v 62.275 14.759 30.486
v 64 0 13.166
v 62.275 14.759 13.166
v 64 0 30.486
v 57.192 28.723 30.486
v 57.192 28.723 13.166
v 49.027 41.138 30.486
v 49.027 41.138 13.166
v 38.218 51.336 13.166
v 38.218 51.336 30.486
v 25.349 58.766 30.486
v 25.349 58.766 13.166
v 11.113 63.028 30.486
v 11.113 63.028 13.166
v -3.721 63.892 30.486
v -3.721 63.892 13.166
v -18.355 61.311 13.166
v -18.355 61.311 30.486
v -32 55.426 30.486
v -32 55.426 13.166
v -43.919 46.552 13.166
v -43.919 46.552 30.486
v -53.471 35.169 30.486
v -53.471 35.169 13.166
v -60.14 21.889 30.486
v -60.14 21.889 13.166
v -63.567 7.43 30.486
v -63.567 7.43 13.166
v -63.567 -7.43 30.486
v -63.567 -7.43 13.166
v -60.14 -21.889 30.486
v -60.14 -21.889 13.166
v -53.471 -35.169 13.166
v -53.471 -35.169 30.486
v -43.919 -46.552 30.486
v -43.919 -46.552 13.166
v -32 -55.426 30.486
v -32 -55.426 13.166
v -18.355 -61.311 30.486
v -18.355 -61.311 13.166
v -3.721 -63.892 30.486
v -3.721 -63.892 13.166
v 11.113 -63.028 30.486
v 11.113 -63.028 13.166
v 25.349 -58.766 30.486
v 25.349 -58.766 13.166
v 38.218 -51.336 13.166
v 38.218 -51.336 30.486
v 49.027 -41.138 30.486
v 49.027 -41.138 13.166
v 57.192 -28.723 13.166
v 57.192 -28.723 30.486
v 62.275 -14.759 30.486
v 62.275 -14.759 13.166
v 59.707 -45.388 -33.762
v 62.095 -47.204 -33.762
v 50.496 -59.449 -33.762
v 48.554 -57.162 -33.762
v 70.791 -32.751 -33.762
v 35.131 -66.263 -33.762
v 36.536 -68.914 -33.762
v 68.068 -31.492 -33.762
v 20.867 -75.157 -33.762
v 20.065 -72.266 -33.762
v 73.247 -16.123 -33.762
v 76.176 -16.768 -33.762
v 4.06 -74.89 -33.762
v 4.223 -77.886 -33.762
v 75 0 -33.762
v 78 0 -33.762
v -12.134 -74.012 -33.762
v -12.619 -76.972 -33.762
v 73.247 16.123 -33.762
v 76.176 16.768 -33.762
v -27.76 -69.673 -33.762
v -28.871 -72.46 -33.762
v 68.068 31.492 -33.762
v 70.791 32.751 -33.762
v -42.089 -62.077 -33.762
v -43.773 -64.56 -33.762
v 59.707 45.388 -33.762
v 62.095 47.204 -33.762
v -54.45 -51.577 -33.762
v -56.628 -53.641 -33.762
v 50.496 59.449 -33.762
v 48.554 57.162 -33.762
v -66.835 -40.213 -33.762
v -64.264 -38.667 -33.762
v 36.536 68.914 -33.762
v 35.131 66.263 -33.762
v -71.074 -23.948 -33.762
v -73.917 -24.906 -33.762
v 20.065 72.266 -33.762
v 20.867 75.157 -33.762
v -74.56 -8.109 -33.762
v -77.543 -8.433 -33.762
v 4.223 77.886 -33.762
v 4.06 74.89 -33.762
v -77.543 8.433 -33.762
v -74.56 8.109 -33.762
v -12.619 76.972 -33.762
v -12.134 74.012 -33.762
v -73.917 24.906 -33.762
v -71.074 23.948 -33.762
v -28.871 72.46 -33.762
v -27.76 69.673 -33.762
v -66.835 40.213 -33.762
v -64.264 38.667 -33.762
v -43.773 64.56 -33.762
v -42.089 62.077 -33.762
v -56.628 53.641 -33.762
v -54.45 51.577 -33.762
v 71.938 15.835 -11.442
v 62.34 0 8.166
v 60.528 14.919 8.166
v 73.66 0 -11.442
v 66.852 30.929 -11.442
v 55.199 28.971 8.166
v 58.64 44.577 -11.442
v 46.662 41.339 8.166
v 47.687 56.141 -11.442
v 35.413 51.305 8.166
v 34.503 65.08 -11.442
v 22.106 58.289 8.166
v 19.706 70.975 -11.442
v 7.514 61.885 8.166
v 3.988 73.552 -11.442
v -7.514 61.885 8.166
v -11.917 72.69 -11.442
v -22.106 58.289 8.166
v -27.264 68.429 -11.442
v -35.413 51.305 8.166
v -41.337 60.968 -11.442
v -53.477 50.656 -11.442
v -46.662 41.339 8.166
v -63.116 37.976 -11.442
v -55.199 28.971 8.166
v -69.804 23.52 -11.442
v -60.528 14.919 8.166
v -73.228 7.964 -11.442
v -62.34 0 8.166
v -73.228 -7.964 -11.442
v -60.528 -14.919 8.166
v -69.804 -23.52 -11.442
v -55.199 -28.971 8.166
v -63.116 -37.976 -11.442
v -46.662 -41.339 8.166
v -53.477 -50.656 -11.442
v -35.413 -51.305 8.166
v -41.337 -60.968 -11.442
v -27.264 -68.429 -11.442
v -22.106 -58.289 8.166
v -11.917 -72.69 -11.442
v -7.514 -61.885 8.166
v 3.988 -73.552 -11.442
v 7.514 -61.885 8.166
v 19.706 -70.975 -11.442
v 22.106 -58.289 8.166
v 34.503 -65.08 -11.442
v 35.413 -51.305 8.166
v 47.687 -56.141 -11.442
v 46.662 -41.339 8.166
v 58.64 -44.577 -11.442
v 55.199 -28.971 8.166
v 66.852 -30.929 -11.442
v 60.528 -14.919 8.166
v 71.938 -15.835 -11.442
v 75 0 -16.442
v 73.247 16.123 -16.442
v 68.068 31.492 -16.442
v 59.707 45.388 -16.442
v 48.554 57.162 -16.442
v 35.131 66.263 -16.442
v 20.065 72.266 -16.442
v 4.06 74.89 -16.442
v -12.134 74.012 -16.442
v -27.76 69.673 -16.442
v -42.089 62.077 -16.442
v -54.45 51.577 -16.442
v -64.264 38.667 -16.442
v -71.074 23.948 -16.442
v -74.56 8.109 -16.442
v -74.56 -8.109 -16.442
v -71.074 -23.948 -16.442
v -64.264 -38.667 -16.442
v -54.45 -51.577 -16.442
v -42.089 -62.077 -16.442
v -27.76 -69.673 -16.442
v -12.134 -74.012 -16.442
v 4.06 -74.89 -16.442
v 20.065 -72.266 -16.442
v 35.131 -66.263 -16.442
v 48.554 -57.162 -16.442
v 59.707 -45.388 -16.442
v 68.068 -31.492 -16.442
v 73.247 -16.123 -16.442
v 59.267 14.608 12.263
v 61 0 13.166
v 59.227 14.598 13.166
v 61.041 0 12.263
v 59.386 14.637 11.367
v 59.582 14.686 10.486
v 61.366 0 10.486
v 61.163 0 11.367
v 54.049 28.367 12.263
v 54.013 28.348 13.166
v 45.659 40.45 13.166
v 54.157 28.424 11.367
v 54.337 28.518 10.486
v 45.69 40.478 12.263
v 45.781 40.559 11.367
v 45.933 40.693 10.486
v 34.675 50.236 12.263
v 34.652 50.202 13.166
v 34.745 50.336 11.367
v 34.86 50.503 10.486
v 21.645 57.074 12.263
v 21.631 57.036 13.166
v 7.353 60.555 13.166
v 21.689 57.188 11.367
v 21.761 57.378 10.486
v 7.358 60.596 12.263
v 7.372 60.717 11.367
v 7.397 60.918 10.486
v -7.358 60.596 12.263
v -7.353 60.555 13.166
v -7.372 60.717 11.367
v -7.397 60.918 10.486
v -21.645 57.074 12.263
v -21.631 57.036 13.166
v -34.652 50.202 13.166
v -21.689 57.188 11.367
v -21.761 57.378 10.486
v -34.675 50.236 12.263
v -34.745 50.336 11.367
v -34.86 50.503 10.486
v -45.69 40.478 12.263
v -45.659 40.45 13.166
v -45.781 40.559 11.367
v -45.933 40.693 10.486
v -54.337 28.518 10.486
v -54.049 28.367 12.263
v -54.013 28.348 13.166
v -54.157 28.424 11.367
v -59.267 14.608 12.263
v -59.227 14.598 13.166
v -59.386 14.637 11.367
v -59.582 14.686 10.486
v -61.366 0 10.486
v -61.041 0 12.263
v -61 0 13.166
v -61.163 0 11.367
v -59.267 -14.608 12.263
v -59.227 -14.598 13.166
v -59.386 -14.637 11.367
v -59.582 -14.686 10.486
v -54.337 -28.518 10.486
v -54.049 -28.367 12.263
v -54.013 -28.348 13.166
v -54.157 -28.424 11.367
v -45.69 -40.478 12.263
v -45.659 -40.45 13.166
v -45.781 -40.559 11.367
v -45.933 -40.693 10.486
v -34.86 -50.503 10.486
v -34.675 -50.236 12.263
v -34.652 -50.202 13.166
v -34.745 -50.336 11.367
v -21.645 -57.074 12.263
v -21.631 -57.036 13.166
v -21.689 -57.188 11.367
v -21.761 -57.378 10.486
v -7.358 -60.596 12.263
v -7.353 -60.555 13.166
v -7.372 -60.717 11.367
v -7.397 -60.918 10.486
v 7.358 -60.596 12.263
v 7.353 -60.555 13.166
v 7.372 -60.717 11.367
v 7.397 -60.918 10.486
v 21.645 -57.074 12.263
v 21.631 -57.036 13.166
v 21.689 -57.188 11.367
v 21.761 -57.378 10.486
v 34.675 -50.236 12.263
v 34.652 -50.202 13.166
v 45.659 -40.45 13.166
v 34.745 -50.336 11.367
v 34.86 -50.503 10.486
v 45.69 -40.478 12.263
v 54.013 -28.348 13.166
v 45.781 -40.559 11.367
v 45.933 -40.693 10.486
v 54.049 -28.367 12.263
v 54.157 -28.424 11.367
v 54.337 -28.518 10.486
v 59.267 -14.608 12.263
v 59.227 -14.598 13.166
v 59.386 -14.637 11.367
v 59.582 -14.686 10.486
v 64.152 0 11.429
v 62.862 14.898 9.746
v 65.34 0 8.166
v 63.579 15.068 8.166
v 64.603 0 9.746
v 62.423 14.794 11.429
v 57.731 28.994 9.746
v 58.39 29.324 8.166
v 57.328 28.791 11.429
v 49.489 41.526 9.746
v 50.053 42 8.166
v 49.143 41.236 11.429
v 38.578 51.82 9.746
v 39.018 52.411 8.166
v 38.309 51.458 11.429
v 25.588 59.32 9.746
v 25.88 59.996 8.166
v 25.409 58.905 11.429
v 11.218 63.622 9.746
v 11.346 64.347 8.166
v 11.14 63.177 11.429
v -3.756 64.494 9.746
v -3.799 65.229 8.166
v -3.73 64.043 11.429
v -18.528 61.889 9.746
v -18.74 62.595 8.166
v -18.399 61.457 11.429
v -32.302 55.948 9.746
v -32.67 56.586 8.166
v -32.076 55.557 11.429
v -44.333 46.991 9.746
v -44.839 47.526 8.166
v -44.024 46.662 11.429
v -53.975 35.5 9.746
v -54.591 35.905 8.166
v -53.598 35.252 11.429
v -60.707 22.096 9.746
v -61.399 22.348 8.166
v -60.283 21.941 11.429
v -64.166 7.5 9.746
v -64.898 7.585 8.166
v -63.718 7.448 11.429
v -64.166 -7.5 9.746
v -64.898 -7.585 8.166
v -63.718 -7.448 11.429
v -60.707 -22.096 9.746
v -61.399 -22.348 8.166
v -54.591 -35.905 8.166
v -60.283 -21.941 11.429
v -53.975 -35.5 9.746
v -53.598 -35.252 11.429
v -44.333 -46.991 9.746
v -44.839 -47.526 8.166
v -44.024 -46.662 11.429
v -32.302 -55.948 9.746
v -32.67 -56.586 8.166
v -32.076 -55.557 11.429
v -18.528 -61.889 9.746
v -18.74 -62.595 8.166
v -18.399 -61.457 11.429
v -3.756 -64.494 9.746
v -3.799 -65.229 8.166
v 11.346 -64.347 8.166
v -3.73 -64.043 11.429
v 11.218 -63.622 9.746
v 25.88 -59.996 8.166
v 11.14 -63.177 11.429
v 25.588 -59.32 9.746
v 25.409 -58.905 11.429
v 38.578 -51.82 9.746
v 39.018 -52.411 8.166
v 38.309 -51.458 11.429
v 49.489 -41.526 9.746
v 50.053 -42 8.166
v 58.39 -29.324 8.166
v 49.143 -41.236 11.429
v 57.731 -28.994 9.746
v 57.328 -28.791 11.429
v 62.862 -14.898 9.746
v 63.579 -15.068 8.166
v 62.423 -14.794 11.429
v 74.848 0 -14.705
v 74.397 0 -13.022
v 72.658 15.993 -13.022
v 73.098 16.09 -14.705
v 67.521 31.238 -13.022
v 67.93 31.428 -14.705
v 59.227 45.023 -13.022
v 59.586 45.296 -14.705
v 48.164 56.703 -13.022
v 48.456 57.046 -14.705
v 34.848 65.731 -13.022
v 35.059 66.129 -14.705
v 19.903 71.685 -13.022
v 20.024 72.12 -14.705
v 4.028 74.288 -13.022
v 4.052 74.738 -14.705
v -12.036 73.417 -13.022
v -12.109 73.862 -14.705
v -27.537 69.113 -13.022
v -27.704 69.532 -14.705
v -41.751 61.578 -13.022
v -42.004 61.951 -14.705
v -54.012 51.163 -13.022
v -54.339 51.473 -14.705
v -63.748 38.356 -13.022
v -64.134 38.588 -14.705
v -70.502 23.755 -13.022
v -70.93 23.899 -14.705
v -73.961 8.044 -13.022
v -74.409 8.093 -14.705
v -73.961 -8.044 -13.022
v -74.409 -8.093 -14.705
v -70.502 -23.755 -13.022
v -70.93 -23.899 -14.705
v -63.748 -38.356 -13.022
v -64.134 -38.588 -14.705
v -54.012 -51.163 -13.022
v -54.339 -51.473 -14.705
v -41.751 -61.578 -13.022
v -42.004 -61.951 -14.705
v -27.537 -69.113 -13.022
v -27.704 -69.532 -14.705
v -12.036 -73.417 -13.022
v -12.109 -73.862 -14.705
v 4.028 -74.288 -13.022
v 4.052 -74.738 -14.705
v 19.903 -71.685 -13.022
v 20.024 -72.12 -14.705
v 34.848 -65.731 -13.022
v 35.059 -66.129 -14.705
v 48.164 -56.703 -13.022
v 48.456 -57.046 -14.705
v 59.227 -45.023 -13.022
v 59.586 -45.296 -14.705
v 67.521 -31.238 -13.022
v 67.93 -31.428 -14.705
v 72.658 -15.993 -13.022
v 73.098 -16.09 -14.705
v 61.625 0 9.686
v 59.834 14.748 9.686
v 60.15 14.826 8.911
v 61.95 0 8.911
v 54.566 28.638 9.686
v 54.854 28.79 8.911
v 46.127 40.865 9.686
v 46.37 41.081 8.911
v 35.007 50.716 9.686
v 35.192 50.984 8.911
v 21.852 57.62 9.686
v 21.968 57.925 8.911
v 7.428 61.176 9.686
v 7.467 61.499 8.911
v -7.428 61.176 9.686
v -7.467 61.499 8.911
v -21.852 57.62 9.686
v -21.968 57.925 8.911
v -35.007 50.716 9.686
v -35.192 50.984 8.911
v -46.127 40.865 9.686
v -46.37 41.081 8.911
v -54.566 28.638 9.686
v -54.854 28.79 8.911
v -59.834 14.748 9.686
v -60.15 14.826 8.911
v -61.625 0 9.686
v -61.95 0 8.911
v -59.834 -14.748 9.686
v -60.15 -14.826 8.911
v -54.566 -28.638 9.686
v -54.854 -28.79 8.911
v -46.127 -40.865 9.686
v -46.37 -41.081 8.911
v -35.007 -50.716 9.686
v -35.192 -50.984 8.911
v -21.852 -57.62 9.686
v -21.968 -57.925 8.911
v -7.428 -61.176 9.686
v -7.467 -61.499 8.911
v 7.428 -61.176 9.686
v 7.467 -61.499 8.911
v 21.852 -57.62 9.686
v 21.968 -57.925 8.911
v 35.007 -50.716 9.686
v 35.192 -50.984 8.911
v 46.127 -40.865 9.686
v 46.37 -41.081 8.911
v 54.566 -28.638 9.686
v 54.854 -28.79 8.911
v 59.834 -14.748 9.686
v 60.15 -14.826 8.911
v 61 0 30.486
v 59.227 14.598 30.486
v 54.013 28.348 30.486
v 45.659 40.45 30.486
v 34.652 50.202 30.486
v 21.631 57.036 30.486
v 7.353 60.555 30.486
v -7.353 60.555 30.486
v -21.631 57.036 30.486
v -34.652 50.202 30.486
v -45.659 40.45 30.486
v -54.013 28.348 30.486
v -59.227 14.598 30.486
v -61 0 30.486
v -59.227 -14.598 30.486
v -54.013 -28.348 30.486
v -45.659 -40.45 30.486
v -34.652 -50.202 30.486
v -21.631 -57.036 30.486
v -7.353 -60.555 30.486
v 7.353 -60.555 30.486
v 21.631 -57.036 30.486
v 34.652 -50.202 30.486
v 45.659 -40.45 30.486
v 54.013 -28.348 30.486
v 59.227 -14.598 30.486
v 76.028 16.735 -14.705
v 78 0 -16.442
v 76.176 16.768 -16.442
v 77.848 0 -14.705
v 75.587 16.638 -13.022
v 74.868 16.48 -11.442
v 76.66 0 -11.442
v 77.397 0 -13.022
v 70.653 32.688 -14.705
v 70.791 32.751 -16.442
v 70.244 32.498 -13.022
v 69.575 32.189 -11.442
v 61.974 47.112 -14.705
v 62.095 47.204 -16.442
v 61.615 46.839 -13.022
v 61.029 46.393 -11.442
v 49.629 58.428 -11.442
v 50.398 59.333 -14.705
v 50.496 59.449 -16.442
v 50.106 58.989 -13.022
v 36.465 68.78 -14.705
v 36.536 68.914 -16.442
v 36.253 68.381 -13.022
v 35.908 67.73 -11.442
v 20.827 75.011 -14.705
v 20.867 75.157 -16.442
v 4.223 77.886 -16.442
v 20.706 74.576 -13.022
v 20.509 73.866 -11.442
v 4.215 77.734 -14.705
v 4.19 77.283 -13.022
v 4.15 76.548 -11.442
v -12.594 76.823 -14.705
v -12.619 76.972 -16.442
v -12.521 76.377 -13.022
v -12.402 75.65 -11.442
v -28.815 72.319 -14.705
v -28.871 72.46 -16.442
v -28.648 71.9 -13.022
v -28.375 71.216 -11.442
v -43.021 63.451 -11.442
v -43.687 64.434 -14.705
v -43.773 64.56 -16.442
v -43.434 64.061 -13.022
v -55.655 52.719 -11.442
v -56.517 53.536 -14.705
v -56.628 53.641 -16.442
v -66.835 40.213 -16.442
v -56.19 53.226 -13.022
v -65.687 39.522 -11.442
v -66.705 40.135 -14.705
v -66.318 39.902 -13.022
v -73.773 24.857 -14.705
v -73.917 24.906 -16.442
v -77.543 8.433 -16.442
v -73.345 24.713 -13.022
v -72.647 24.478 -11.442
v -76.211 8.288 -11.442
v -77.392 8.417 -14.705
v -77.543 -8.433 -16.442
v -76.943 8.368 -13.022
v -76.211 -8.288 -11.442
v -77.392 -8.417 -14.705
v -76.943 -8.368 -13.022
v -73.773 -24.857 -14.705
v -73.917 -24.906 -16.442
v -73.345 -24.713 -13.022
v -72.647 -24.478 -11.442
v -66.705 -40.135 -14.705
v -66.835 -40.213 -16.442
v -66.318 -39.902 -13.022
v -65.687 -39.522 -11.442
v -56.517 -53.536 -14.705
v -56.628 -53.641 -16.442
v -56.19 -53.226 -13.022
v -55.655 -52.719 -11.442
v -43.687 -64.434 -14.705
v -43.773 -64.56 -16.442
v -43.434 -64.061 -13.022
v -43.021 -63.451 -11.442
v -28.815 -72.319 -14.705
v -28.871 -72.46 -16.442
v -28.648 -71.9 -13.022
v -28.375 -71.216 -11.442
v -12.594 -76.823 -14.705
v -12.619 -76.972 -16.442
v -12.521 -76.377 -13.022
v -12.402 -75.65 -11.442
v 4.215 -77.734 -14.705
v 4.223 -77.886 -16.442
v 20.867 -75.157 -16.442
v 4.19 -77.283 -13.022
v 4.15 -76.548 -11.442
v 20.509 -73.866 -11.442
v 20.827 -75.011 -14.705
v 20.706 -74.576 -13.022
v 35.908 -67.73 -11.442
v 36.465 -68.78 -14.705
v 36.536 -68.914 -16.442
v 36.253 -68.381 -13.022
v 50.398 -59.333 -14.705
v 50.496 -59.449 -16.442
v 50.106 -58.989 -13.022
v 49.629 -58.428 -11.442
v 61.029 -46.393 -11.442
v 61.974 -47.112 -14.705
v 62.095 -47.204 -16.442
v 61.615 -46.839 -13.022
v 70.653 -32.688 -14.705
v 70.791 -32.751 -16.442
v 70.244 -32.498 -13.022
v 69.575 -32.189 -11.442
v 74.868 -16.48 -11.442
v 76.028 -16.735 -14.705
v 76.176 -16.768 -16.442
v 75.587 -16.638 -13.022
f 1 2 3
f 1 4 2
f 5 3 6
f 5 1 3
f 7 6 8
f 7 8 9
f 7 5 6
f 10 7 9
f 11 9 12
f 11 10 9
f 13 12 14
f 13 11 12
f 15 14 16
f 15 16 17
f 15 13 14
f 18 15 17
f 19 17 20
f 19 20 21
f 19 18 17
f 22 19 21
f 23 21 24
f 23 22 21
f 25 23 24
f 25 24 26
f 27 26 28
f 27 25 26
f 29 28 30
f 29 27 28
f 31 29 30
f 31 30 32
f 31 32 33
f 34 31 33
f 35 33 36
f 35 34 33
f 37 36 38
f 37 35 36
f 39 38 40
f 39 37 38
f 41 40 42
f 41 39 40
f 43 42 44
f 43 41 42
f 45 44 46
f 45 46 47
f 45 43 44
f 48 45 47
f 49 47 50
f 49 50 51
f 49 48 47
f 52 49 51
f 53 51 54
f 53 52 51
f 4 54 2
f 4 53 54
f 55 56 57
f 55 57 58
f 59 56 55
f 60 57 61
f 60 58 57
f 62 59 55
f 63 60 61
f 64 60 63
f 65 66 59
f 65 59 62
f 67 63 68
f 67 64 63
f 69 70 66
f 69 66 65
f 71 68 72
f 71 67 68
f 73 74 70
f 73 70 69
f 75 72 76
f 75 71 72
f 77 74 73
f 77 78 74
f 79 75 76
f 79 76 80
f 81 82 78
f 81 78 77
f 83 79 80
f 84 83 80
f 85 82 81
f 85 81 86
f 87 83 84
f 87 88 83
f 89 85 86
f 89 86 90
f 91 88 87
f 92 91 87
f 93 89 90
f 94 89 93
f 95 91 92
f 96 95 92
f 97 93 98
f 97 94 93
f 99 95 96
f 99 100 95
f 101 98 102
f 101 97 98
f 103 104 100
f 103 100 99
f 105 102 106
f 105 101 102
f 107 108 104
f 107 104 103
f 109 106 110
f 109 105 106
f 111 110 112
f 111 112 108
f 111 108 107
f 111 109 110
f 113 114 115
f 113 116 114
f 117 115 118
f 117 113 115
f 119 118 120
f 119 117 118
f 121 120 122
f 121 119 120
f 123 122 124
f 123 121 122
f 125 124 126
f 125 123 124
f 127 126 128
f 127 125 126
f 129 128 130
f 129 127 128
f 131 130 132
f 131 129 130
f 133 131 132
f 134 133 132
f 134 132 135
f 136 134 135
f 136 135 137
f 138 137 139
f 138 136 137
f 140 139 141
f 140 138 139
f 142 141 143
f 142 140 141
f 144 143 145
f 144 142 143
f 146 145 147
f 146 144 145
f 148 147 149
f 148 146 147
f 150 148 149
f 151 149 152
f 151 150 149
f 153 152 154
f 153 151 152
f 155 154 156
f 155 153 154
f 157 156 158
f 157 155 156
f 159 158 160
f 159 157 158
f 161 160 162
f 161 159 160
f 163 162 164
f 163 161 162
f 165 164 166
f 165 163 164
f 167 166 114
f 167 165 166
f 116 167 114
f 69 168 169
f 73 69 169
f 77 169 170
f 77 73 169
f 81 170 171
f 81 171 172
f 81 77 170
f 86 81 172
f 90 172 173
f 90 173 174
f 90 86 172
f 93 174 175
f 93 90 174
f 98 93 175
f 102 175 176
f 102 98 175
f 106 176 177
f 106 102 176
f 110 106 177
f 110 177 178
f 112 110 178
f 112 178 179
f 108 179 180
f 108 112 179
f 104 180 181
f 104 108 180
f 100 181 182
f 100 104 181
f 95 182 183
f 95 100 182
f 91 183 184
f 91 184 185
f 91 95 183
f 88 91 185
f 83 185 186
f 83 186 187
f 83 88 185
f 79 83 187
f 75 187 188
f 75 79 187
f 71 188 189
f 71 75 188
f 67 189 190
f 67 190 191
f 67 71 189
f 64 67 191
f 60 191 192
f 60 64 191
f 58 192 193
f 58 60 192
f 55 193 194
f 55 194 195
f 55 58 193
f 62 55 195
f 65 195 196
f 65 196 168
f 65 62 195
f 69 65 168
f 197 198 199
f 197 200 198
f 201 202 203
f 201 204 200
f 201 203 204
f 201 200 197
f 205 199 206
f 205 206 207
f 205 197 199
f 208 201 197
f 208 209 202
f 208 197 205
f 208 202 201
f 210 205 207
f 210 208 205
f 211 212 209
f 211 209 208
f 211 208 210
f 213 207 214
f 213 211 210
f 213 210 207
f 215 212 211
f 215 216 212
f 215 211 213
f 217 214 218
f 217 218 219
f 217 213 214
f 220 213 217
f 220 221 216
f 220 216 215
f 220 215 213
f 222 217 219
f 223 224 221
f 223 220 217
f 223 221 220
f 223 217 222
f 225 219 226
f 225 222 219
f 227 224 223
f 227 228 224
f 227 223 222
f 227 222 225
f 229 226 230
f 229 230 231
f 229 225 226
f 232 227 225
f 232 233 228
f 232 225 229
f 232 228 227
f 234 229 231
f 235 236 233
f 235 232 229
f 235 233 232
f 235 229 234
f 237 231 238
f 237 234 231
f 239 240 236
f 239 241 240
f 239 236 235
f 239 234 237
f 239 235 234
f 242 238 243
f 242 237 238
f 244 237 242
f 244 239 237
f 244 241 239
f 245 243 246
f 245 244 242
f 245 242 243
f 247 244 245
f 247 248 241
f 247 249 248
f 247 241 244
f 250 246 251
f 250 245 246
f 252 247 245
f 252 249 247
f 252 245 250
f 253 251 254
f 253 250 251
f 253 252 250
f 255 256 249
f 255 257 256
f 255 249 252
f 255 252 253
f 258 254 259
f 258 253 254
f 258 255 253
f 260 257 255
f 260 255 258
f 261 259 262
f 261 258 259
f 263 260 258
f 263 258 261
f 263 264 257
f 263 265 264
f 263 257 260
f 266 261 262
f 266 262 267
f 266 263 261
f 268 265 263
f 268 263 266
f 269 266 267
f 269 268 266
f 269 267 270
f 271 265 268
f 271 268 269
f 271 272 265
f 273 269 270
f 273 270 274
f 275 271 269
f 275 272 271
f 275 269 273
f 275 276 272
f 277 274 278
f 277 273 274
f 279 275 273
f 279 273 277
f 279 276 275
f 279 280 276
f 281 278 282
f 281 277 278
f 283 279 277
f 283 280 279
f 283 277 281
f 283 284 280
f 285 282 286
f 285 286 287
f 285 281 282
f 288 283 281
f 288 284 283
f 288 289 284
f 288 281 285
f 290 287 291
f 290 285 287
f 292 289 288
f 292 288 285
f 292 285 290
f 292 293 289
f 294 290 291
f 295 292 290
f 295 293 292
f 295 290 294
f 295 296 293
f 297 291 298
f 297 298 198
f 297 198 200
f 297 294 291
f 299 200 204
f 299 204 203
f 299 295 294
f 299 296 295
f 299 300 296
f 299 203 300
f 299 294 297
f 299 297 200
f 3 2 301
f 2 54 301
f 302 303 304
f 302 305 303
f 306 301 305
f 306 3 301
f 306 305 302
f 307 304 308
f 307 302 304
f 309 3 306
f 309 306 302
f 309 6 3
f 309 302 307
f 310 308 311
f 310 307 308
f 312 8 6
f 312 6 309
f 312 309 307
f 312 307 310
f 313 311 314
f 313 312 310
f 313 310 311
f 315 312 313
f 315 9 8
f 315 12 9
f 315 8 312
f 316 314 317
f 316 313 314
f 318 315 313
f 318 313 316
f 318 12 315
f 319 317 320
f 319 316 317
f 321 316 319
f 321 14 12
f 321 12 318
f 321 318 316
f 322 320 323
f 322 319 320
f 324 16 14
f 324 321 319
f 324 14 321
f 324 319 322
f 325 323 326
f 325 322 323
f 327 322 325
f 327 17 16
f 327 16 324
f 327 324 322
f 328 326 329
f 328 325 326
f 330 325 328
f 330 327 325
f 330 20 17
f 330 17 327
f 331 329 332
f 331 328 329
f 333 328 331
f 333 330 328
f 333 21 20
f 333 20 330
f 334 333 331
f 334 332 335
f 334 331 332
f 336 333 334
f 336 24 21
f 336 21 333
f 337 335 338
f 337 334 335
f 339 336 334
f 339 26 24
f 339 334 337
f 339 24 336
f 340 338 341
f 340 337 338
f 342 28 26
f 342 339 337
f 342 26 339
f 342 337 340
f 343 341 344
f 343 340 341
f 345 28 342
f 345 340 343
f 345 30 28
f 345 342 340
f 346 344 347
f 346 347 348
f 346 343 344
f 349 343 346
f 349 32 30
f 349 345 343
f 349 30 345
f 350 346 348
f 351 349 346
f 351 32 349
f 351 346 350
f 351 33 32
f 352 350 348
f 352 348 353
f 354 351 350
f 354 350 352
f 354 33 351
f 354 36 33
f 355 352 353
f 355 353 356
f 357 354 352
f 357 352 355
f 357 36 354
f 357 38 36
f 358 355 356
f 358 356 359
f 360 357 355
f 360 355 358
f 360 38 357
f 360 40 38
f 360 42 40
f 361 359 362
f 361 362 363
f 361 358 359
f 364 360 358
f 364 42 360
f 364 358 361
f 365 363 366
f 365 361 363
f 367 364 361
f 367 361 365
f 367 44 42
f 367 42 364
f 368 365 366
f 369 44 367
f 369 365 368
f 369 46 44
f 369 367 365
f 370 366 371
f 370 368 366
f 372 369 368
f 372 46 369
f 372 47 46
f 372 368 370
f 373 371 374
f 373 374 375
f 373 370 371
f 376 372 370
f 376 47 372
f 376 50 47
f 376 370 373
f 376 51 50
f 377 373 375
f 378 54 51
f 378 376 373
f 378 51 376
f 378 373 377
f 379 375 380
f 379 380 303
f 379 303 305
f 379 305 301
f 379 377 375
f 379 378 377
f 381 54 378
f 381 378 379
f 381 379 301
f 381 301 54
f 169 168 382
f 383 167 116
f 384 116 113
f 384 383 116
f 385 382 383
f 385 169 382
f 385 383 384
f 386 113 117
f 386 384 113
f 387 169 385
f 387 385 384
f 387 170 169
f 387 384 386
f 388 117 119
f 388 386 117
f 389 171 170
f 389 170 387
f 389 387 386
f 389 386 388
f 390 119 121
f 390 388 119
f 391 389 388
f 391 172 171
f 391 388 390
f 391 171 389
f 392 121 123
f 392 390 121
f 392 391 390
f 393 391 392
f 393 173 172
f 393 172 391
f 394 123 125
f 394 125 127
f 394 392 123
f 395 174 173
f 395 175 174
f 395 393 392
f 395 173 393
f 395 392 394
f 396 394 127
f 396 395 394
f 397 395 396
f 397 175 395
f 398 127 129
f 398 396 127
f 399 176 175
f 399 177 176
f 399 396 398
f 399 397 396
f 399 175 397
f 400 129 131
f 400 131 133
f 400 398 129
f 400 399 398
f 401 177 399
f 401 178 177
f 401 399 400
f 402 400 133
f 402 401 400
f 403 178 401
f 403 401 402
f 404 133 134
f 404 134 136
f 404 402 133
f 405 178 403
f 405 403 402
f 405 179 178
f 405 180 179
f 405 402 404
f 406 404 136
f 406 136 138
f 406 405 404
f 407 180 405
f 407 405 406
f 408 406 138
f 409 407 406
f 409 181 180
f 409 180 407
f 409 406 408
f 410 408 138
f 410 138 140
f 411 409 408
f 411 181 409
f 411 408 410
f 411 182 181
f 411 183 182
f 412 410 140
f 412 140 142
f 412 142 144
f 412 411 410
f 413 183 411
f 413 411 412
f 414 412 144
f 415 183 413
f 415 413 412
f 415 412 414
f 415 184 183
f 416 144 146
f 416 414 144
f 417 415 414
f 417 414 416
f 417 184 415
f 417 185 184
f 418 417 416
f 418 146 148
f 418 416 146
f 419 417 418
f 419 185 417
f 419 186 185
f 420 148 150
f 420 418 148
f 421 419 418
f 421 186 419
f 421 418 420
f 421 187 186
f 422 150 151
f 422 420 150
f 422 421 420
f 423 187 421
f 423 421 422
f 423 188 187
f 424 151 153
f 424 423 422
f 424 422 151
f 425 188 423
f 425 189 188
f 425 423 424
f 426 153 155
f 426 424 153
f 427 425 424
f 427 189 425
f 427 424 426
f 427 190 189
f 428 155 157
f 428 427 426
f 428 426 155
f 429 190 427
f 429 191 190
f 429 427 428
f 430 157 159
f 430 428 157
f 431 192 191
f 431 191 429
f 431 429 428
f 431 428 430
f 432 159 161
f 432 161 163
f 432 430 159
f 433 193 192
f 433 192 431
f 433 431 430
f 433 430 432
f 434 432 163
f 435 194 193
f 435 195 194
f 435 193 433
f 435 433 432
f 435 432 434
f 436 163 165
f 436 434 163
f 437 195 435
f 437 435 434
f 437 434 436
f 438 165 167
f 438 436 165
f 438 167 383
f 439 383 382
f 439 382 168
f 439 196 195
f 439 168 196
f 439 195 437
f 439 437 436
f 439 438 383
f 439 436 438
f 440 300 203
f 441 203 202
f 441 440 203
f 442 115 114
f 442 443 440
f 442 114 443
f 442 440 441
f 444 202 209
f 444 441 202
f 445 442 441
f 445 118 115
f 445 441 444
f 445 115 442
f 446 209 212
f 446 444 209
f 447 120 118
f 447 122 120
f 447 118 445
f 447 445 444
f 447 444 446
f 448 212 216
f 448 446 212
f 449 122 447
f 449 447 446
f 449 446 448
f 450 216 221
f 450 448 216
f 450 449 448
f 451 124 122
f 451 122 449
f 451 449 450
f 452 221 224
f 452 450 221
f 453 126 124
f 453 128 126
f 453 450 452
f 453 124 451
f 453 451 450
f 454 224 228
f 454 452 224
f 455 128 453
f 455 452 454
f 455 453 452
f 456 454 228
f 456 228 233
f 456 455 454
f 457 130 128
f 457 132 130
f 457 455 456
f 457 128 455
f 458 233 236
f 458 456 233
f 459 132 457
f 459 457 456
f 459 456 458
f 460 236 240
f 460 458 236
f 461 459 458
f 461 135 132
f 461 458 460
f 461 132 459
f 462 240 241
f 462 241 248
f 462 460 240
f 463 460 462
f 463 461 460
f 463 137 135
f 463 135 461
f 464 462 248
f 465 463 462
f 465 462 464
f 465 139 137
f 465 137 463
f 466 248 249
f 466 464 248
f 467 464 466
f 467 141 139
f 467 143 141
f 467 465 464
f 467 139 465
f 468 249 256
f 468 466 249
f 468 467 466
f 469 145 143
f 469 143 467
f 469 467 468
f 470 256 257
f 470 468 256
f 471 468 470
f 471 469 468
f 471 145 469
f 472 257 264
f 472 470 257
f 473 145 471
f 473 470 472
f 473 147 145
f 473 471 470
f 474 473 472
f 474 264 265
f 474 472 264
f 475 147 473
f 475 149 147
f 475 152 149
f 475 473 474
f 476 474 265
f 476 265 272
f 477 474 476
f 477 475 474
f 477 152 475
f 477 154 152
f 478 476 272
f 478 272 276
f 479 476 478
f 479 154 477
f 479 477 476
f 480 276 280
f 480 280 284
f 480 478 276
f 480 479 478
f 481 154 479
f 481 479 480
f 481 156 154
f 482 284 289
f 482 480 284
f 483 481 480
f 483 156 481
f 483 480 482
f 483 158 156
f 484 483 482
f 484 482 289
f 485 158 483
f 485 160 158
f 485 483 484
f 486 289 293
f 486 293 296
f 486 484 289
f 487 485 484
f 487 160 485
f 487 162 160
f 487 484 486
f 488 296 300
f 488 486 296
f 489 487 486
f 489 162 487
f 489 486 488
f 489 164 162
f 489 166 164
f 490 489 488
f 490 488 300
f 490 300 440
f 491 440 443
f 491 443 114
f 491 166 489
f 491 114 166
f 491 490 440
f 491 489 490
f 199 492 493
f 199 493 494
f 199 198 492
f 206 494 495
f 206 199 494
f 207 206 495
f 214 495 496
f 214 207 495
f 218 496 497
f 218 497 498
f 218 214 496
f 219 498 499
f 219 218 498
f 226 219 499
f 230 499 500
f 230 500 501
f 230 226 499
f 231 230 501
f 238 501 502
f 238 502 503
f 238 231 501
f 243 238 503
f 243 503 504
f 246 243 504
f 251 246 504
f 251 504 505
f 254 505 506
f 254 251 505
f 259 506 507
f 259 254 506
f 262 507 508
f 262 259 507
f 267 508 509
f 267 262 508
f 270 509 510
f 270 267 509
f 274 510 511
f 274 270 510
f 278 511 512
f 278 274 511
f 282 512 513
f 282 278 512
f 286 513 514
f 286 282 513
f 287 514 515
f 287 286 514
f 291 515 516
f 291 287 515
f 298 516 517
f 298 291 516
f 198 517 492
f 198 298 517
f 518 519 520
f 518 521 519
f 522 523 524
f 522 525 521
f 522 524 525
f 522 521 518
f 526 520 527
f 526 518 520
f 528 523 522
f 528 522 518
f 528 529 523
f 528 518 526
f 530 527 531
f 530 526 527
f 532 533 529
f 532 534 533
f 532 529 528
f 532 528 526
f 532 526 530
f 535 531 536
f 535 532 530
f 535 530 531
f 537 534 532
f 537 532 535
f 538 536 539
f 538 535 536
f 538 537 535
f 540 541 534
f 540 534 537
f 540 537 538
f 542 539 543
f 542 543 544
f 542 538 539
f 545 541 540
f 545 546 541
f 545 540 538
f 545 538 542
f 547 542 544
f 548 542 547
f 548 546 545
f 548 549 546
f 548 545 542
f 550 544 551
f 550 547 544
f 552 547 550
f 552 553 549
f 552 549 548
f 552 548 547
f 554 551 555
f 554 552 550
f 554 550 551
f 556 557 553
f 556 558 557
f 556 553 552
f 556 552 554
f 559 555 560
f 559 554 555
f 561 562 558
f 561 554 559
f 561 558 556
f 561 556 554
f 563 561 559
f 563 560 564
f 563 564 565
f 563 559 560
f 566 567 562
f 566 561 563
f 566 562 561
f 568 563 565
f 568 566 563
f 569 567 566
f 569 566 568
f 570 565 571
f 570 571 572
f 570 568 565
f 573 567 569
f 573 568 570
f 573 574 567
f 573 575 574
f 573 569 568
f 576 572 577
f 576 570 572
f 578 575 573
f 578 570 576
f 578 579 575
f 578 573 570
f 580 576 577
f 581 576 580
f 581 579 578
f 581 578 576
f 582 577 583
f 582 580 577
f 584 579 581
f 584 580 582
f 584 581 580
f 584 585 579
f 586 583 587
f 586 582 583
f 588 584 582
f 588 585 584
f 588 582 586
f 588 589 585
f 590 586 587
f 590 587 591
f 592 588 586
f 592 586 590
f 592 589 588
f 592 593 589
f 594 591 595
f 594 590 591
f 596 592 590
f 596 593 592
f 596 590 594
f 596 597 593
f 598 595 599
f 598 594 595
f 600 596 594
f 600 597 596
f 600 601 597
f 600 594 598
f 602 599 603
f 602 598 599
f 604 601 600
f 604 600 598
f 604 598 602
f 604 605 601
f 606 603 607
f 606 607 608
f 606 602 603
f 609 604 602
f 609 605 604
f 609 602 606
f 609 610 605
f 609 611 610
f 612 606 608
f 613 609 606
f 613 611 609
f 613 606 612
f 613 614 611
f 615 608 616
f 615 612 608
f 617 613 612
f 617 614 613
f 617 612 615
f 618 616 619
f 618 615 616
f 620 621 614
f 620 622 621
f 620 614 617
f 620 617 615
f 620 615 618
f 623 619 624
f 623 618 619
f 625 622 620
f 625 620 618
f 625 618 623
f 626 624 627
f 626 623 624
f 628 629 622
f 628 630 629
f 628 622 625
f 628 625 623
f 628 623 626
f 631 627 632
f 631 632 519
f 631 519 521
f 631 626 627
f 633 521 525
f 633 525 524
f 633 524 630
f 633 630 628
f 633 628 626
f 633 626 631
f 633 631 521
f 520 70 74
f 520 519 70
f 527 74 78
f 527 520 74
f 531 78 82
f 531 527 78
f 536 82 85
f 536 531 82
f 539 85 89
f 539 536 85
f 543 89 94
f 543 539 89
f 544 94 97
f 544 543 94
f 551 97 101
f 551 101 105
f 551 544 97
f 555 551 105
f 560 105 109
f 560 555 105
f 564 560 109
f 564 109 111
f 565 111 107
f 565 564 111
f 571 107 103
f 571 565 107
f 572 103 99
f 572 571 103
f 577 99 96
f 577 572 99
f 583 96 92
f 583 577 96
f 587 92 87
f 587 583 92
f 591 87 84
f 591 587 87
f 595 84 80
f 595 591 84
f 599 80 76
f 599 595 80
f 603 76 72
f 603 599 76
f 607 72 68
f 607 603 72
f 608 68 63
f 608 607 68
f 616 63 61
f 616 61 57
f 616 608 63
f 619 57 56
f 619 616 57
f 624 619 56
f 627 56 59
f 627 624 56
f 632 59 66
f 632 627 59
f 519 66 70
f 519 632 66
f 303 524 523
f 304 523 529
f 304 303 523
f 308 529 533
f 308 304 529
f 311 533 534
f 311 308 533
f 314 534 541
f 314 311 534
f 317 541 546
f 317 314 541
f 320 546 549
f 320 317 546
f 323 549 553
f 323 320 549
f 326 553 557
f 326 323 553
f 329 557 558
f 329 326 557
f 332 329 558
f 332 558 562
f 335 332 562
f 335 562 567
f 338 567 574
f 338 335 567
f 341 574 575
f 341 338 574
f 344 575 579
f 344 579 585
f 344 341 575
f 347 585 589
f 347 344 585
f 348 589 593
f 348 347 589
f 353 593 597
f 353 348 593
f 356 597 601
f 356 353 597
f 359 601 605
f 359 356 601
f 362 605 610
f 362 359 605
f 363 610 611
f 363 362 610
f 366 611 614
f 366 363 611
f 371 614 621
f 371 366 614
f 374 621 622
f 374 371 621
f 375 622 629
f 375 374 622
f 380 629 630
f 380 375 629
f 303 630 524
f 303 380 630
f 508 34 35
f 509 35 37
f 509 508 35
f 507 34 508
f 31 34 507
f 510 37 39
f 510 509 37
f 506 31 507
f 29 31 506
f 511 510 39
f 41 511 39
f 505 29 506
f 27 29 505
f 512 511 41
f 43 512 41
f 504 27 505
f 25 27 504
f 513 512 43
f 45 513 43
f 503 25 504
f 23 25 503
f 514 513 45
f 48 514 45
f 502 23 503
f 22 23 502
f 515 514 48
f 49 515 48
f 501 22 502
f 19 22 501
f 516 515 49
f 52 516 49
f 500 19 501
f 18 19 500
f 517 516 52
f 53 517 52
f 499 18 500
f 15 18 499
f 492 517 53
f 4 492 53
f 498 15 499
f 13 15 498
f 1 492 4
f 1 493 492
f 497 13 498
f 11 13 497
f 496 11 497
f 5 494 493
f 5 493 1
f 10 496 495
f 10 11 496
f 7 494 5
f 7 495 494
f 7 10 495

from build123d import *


with BuildPart() as f1:
    # F0 (on Front) → F1 (revolve)
    with BuildSketch(Plane.XZ):
        with BuildLine():
            ThreePointArc((61.36567, 10.486363), (61.779417, 9.295344), (62.339746, 8.165855))
            Line((62.339746, 8.165855), (73.660254, -11.44184))
            ThreePointArc((73.660254, -11.44184), (74.659258, -13.853649), (75, -16.44184))
            Line((75, -16.44184), (75, -33.762348))
            Line((75, -33.762348), (78, -33.762348))
            Line((78, -33.762348), (78, -16.44184))
            ThreePointArc((78, -16.44184), (77.659258, -13.853649), (76.660254, -11.44184))
            Line((76.660254, -11.44184), (65.339746, 8.165855))
            ThreePointArc((65.339746, 8.165855), (64.340742, 10.577665), (64, 13.165855))
            Line((64, 13.165855), (64, 30.486363))
            Line((64, 30.486363), (61, 30.486363))
            Line((61, 30.486363), (61, 13.165855))
            ThreePointArc((61, 13.165855), (61.091839, 11.813691), (61.36567, 10.486363))
        make_face()
    revolve(axis=Axis((0, 0, 3.03654), (0, 0, 1)))


solid = f1.part
